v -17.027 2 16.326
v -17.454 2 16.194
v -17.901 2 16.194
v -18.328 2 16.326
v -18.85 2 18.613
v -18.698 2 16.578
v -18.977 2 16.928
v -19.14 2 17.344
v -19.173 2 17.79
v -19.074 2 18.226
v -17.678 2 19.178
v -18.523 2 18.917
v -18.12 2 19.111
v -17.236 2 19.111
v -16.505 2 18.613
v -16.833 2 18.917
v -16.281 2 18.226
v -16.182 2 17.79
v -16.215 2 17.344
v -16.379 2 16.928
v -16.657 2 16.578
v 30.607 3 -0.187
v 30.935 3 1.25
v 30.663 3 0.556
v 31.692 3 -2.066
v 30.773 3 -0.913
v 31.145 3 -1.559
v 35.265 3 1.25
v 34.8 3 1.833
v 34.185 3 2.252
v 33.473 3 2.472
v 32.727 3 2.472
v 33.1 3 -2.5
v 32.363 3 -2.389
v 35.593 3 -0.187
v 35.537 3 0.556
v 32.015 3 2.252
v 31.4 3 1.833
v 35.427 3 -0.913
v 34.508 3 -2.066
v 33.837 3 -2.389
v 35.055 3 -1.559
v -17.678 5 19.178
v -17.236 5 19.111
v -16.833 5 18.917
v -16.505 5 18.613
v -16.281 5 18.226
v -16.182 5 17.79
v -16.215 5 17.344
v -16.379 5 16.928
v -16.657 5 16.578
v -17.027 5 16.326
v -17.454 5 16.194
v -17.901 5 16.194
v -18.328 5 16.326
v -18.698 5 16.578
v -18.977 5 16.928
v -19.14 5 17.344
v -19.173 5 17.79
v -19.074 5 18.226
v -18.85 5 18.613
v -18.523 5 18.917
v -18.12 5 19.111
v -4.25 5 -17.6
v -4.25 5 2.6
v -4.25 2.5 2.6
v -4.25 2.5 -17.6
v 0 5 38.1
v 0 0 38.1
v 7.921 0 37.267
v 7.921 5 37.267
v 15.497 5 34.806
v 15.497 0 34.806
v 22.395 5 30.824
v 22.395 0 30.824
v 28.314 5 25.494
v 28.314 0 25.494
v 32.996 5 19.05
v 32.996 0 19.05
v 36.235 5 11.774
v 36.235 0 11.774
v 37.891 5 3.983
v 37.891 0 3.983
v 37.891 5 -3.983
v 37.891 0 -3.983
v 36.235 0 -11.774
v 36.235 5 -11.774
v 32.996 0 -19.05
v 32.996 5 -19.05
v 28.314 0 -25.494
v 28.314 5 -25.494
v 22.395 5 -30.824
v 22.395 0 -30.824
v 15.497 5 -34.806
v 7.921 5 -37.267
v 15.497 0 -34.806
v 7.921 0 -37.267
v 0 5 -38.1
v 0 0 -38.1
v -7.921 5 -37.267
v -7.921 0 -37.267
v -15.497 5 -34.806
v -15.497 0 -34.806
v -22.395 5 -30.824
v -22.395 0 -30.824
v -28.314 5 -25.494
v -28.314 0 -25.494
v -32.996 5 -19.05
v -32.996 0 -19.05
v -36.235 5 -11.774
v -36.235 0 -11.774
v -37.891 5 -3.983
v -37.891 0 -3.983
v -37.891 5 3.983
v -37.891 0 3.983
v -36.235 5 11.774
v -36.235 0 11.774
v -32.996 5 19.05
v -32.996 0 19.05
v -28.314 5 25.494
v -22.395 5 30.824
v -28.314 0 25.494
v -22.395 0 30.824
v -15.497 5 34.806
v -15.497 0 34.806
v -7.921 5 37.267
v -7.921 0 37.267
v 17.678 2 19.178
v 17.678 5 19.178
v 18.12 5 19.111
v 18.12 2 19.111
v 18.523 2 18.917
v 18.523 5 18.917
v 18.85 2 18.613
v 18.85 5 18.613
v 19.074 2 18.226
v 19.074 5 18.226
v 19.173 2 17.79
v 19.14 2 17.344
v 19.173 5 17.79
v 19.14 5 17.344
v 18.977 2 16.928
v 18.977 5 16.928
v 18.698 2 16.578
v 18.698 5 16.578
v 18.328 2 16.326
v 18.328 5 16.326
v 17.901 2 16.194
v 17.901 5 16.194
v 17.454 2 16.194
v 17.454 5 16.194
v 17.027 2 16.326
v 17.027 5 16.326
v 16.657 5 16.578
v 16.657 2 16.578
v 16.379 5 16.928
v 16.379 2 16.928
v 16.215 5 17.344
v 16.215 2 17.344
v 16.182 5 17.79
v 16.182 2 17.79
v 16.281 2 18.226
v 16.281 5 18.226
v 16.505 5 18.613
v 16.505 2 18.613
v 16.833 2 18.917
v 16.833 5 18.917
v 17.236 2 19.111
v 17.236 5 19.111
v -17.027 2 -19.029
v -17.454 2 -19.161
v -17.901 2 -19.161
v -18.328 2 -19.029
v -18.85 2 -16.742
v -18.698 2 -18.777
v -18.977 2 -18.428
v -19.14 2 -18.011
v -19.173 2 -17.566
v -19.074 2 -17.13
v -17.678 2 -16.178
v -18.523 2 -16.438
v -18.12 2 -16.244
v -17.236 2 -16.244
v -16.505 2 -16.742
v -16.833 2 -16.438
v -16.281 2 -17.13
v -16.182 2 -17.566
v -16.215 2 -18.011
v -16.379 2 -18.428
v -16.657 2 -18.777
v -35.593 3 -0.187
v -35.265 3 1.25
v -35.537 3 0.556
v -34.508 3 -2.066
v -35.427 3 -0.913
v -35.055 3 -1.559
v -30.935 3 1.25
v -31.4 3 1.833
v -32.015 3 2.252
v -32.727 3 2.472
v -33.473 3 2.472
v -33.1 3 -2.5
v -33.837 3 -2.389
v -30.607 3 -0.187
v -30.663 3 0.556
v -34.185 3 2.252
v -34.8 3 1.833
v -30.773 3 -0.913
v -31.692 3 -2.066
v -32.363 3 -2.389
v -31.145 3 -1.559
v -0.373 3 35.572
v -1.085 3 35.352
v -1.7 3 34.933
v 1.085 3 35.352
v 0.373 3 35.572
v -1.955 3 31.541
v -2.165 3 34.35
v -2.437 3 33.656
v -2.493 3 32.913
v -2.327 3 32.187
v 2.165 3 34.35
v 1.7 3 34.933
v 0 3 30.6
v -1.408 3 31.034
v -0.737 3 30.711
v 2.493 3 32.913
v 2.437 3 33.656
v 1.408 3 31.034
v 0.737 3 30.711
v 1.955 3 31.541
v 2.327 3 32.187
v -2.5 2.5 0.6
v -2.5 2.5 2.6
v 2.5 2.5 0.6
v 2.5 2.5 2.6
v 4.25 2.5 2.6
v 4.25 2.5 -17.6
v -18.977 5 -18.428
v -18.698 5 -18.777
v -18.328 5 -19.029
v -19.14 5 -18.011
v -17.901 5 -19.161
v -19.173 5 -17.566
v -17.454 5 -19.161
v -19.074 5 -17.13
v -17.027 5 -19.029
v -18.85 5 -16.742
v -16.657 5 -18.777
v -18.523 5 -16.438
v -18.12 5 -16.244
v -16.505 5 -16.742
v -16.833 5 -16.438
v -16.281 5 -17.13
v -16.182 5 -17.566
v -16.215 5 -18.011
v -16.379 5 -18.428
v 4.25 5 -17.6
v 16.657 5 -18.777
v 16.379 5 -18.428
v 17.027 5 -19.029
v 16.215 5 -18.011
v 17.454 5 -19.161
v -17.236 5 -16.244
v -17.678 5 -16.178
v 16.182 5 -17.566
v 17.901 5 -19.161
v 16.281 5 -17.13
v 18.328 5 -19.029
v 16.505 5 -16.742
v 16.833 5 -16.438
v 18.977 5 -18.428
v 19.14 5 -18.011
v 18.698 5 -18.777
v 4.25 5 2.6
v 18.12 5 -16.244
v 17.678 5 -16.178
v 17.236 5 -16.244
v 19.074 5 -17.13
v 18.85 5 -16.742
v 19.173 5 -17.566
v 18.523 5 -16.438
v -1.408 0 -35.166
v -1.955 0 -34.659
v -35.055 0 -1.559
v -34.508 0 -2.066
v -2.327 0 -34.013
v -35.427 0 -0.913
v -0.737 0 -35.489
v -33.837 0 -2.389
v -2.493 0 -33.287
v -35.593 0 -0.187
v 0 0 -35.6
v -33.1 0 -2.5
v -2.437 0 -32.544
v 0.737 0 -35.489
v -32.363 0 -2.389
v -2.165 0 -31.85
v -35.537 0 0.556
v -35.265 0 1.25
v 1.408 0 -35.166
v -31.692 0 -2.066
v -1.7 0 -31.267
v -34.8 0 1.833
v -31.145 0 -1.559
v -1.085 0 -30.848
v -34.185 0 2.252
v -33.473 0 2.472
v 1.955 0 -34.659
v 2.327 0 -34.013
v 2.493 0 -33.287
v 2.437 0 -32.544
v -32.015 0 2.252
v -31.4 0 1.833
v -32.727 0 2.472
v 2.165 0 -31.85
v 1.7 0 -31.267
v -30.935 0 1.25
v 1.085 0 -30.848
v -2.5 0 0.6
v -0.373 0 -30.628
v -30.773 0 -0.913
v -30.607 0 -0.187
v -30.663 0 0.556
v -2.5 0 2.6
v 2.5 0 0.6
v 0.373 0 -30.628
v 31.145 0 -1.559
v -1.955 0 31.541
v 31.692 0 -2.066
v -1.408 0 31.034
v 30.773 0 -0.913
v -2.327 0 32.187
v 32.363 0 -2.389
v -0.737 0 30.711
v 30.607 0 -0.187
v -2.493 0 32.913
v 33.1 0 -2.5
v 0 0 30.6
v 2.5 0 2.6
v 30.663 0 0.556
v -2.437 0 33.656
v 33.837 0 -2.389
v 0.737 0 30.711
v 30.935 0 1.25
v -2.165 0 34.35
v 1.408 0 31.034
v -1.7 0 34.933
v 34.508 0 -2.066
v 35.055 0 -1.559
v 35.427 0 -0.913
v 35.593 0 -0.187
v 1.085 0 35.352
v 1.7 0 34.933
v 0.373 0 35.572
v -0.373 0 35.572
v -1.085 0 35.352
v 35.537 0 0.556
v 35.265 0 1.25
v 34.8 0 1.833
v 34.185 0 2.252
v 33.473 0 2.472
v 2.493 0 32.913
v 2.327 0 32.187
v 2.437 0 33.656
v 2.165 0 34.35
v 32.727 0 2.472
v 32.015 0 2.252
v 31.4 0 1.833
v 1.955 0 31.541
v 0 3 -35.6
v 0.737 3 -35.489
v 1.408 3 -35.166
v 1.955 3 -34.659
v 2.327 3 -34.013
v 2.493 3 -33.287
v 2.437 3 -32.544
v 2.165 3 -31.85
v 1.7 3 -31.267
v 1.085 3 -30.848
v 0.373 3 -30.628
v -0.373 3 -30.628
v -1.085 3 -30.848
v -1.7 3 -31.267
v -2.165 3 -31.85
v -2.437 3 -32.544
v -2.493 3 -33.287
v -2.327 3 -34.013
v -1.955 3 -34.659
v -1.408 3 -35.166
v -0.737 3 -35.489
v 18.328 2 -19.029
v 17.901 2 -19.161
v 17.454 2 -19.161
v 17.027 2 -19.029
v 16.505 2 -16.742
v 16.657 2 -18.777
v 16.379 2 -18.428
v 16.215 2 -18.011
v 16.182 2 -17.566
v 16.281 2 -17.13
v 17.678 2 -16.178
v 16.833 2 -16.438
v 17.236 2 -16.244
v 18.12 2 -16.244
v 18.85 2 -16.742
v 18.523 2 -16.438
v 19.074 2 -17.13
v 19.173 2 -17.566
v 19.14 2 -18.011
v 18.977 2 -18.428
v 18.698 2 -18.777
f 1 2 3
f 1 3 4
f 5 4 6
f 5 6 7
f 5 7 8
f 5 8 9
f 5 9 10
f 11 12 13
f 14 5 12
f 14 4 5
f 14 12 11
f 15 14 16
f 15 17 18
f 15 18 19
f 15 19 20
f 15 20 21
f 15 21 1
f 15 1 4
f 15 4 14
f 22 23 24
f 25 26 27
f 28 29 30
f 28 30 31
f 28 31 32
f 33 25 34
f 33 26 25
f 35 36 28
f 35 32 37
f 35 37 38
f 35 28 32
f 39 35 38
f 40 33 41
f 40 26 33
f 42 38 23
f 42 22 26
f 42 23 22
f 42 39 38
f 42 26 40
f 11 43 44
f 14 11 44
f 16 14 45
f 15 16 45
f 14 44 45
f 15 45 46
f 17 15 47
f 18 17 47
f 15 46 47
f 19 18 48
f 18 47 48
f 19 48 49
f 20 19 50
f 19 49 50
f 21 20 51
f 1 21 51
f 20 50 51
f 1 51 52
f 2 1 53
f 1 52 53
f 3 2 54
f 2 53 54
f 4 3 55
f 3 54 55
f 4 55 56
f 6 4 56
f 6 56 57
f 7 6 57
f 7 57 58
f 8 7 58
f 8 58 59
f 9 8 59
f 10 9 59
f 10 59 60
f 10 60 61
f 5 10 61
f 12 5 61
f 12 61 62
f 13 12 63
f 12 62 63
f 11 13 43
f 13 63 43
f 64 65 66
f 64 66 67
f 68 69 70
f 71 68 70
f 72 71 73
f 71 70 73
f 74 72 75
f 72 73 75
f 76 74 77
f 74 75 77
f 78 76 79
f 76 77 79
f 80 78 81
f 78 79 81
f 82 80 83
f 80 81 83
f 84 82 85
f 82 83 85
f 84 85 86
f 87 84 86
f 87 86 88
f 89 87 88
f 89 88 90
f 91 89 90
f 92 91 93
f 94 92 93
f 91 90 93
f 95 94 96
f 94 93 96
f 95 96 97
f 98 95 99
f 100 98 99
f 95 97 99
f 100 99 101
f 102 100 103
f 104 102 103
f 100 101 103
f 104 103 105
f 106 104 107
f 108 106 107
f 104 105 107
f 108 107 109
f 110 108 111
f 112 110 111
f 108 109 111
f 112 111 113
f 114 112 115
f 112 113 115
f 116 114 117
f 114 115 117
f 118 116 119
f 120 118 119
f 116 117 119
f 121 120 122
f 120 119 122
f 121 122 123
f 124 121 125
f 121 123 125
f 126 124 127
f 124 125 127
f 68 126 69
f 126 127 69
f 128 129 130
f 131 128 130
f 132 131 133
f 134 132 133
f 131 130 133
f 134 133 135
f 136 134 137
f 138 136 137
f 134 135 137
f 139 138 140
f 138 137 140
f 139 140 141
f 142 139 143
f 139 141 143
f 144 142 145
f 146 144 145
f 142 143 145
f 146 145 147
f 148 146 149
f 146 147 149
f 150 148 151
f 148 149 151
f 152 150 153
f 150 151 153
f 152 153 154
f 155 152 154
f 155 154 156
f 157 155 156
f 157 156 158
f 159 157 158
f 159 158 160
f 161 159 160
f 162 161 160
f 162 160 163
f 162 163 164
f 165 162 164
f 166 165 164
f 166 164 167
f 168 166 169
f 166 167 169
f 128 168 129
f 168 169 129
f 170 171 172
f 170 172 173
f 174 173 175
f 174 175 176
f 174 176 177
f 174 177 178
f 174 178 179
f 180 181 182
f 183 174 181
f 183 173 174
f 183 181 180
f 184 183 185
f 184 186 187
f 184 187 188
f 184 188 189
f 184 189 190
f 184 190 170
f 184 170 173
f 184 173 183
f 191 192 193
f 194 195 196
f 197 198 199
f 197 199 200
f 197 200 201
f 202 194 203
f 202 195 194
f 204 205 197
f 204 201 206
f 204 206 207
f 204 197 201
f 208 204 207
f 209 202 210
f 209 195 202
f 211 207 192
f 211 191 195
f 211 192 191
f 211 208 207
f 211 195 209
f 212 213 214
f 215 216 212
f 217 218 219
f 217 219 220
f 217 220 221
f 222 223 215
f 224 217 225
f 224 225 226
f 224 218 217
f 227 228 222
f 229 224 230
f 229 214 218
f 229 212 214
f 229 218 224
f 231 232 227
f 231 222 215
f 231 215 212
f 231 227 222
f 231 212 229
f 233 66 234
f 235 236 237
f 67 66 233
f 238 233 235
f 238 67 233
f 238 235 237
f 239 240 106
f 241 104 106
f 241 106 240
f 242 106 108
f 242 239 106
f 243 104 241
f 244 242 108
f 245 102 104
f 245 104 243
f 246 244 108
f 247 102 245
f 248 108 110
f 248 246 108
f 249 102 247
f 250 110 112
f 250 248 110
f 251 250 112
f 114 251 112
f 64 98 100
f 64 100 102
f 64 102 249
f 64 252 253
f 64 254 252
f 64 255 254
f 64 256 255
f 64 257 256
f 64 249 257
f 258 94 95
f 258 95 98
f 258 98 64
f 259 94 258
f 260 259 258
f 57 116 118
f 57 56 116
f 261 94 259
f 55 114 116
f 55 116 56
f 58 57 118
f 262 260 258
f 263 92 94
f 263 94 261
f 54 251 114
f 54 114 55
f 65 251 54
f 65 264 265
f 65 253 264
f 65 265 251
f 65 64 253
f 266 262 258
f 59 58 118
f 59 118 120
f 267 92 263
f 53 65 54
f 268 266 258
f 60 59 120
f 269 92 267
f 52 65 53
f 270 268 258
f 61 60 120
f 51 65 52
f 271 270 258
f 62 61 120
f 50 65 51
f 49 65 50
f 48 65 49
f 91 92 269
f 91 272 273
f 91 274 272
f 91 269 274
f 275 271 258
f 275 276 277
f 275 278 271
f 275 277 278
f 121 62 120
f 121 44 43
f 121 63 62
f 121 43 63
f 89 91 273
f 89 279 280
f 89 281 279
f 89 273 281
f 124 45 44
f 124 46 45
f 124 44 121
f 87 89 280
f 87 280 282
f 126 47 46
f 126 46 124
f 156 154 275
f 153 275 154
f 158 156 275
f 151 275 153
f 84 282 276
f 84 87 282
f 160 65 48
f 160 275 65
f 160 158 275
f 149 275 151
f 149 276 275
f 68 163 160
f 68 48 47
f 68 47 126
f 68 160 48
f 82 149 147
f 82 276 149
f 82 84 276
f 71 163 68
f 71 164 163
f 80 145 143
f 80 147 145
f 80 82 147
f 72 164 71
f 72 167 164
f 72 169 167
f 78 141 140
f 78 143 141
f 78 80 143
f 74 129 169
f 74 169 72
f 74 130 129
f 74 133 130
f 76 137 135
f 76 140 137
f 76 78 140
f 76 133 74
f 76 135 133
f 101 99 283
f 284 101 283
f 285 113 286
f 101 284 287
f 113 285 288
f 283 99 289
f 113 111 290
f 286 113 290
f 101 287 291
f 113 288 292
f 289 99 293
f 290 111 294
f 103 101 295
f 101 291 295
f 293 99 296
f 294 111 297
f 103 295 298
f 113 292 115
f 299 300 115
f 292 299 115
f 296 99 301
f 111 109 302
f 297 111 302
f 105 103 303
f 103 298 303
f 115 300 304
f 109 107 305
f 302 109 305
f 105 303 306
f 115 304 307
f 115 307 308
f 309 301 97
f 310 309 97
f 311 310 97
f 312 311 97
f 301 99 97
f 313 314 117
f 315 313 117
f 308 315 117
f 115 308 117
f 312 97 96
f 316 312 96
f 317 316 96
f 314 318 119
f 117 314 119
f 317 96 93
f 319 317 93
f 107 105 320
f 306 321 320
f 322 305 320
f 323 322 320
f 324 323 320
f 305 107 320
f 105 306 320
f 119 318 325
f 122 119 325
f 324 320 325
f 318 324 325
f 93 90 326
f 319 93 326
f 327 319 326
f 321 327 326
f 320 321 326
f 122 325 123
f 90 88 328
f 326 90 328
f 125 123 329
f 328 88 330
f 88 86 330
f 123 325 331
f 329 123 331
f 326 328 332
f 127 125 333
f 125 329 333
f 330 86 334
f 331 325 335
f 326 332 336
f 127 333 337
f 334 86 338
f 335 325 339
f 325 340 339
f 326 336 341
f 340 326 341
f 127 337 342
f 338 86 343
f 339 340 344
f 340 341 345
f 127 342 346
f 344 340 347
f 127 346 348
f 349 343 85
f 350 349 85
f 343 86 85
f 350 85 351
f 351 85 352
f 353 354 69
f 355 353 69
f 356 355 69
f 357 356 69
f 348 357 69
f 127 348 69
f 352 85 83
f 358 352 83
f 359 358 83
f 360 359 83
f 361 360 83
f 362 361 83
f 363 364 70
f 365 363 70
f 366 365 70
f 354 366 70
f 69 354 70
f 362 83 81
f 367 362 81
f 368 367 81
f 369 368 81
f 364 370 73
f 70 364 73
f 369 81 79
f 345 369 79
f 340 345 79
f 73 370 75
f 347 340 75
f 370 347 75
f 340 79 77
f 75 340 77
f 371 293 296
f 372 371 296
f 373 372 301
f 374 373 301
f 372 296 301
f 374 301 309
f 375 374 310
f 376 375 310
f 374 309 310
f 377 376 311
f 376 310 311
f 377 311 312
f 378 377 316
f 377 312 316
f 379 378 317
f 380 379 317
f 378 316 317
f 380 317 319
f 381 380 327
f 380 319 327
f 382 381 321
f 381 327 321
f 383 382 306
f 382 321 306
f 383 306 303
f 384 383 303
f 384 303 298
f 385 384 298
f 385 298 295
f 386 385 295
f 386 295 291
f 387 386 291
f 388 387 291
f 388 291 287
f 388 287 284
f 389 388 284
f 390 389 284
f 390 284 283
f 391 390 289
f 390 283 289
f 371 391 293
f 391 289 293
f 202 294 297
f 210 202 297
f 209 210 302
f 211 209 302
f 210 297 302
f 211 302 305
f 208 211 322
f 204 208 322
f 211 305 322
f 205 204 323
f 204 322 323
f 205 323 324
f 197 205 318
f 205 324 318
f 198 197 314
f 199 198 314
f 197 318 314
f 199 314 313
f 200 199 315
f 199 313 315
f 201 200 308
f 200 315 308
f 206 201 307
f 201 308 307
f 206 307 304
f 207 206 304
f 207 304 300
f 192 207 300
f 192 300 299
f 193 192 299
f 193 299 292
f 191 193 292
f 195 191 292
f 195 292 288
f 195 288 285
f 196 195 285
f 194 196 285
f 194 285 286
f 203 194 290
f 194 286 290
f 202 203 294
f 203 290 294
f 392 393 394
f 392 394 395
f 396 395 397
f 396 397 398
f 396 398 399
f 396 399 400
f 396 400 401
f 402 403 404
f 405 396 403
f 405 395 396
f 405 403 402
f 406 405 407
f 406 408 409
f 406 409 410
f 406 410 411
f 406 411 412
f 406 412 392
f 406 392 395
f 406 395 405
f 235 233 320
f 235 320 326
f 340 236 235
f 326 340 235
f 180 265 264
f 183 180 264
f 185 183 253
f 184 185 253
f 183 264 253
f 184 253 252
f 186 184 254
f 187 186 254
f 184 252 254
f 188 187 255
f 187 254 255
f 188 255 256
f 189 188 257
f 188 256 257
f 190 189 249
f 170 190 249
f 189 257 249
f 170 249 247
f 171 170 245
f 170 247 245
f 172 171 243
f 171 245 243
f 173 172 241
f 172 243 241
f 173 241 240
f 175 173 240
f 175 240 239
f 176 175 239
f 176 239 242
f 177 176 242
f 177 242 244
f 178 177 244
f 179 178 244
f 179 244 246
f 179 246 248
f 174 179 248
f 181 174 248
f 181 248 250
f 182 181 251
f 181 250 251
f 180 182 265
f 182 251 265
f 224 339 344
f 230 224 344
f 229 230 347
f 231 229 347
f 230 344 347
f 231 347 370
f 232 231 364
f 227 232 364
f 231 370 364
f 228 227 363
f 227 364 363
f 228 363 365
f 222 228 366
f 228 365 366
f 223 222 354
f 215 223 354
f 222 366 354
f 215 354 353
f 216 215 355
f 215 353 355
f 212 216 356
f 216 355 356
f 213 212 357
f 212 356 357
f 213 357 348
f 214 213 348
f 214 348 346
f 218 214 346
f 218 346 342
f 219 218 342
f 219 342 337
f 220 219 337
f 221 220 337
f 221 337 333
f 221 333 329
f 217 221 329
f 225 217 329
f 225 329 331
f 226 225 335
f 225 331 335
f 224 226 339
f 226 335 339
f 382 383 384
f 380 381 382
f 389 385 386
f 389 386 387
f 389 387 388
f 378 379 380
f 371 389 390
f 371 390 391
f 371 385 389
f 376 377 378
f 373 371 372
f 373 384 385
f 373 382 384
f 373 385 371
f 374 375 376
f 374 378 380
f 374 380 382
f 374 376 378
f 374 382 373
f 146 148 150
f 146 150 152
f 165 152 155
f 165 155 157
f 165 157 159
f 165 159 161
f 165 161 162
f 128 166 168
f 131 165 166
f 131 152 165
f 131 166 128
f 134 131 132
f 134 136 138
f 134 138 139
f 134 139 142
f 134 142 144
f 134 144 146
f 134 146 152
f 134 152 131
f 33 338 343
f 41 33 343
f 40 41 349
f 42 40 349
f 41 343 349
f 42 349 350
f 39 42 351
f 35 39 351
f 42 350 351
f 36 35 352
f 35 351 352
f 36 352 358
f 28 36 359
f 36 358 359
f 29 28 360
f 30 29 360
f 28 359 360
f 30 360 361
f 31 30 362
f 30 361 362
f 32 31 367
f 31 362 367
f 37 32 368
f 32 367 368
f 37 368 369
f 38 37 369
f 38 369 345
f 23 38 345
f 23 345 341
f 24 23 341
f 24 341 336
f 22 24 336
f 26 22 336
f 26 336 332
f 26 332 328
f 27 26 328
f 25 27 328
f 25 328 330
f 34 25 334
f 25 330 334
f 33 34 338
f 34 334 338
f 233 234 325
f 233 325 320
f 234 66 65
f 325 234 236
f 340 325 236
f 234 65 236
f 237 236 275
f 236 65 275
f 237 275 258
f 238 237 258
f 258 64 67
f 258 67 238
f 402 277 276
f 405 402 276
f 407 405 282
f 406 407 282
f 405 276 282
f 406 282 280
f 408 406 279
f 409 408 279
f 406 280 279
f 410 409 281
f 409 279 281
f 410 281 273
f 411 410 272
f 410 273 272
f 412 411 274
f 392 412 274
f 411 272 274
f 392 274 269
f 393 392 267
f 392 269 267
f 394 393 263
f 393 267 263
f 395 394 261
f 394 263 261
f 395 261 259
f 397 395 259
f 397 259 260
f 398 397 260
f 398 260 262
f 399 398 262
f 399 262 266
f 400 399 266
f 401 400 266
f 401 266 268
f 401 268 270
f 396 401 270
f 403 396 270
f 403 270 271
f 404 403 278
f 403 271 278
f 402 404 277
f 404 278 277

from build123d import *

# Parameters (mm, degrees)
SKETCH1_R           = 38.1
BOSS_EXTRUDE1_DEPTH = 5
SKETCH3_W           = 8.5
SKETCH3_H           = 20.2
CUT_EXTRUDE2_DEPTH  = 2.5
SKETCH4_W           = 5
SKETCH4_H           = 2
CUT_EXTRUDE4_DEPTH  = 54.939503149
SKETCH5_R           = 1.5
CUT_EXTRUDE5_DEPTH  = 3
SKETCH6_R           = 2.5
CUT_EXTRUDE6_DEPTH  = 3


with BuildPart() as part:
    # Sketch1 → Boss-Extrude1 (new body)
    with BuildSketch(Plane(origin=(0, 0, 0), x_dir=(1, 0, 0), z_dir=(0, 1, 0))):
        with Locations(Location((0, 0, 0), (0, 0, 270))):
            Circle(SKETCH1_R)
    extrude(amount=BOSS_EXTRUDE1_DEPTH)

    # Sketch3 → Cut-Extrude2 (cut)
    with BuildSketch(Plane(origin=(0, 5, 0), x_dir=(1, 0, 0), z_dir=(0, 1, 0))):
        with Locations((0, 7.5)):
            Rectangle(SKETCH3_W, SKETCH3_H)
    extrude(amount=-CUT_EXTRUDE2_DEPTH, mode=Mode.SUBTRACT)

    # Sketch4 → Cut-Extrude4 (cut, through all)
    with BuildSketch(Plane(origin=(0, 2.5, 0), x_dir=(1, 0, 0), z_dir=(0, 1, 0))):
        with Locations((0, -1.6)):
            Rectangle(SKETCH4_W, SKETCH4_H)
    extrude(amount=-CUT_EXTRUDE4_DEPTH, mode=Mode.SUBTRACT)

    # Sketch5 → Cut-Extrude5 (cut)
    with BuildSketch(Plane(origin=(0, 5, 0), x_dir=(1, 0, 0), z_dir=(0, 1, 0))):
        with Locations(Location((17.67766953, 17.67766953, 0), (0, 0, 270))):
            Circle(SKETCH5_R)
        with Locations(Location((-17.67766953, 17.67766953, 0), (0, 0, 270))):
            Circle(SKETCH5_R)
        with Locations(Location((-17.67766953, -17.67766953, 0), (0, 0, 270))):
            Circle(SKETCH5_R)
        with Locations(Location((17.67766953, -17.67766953, 0), (0, 0, 270))):
            Circle(SKETCH5_R)
    extrude(amount=-CUT_EXTRUDE5_DEPTH, mode=Mode.SUBTRACT)

    # Sketch6 → Cut-Extrude6 (cut)
    with BuildSketch(Plane.XZ):
        with Locations(Location((0, -33.1, 0), (0, 0, 270))):
            Circle(SKETCH6_R)
        with Locations(Location((33.1, 0, 0), (0, 0, 270))):
            Circle(SKETCH6_R)
        with Locations(Location((0, 33.1, 0), (0, 0, 270))):
            Circle(SKETCH6_R)
        with Locations(Location((-33.1, 0, 0), (0, 0, 270))):
            Circle(SKETCH6_R)
    extrude(amount=-CUT_EXTRUDE6_DEPTH, mode=Mode.SUBTRACT)


solid = part.part
